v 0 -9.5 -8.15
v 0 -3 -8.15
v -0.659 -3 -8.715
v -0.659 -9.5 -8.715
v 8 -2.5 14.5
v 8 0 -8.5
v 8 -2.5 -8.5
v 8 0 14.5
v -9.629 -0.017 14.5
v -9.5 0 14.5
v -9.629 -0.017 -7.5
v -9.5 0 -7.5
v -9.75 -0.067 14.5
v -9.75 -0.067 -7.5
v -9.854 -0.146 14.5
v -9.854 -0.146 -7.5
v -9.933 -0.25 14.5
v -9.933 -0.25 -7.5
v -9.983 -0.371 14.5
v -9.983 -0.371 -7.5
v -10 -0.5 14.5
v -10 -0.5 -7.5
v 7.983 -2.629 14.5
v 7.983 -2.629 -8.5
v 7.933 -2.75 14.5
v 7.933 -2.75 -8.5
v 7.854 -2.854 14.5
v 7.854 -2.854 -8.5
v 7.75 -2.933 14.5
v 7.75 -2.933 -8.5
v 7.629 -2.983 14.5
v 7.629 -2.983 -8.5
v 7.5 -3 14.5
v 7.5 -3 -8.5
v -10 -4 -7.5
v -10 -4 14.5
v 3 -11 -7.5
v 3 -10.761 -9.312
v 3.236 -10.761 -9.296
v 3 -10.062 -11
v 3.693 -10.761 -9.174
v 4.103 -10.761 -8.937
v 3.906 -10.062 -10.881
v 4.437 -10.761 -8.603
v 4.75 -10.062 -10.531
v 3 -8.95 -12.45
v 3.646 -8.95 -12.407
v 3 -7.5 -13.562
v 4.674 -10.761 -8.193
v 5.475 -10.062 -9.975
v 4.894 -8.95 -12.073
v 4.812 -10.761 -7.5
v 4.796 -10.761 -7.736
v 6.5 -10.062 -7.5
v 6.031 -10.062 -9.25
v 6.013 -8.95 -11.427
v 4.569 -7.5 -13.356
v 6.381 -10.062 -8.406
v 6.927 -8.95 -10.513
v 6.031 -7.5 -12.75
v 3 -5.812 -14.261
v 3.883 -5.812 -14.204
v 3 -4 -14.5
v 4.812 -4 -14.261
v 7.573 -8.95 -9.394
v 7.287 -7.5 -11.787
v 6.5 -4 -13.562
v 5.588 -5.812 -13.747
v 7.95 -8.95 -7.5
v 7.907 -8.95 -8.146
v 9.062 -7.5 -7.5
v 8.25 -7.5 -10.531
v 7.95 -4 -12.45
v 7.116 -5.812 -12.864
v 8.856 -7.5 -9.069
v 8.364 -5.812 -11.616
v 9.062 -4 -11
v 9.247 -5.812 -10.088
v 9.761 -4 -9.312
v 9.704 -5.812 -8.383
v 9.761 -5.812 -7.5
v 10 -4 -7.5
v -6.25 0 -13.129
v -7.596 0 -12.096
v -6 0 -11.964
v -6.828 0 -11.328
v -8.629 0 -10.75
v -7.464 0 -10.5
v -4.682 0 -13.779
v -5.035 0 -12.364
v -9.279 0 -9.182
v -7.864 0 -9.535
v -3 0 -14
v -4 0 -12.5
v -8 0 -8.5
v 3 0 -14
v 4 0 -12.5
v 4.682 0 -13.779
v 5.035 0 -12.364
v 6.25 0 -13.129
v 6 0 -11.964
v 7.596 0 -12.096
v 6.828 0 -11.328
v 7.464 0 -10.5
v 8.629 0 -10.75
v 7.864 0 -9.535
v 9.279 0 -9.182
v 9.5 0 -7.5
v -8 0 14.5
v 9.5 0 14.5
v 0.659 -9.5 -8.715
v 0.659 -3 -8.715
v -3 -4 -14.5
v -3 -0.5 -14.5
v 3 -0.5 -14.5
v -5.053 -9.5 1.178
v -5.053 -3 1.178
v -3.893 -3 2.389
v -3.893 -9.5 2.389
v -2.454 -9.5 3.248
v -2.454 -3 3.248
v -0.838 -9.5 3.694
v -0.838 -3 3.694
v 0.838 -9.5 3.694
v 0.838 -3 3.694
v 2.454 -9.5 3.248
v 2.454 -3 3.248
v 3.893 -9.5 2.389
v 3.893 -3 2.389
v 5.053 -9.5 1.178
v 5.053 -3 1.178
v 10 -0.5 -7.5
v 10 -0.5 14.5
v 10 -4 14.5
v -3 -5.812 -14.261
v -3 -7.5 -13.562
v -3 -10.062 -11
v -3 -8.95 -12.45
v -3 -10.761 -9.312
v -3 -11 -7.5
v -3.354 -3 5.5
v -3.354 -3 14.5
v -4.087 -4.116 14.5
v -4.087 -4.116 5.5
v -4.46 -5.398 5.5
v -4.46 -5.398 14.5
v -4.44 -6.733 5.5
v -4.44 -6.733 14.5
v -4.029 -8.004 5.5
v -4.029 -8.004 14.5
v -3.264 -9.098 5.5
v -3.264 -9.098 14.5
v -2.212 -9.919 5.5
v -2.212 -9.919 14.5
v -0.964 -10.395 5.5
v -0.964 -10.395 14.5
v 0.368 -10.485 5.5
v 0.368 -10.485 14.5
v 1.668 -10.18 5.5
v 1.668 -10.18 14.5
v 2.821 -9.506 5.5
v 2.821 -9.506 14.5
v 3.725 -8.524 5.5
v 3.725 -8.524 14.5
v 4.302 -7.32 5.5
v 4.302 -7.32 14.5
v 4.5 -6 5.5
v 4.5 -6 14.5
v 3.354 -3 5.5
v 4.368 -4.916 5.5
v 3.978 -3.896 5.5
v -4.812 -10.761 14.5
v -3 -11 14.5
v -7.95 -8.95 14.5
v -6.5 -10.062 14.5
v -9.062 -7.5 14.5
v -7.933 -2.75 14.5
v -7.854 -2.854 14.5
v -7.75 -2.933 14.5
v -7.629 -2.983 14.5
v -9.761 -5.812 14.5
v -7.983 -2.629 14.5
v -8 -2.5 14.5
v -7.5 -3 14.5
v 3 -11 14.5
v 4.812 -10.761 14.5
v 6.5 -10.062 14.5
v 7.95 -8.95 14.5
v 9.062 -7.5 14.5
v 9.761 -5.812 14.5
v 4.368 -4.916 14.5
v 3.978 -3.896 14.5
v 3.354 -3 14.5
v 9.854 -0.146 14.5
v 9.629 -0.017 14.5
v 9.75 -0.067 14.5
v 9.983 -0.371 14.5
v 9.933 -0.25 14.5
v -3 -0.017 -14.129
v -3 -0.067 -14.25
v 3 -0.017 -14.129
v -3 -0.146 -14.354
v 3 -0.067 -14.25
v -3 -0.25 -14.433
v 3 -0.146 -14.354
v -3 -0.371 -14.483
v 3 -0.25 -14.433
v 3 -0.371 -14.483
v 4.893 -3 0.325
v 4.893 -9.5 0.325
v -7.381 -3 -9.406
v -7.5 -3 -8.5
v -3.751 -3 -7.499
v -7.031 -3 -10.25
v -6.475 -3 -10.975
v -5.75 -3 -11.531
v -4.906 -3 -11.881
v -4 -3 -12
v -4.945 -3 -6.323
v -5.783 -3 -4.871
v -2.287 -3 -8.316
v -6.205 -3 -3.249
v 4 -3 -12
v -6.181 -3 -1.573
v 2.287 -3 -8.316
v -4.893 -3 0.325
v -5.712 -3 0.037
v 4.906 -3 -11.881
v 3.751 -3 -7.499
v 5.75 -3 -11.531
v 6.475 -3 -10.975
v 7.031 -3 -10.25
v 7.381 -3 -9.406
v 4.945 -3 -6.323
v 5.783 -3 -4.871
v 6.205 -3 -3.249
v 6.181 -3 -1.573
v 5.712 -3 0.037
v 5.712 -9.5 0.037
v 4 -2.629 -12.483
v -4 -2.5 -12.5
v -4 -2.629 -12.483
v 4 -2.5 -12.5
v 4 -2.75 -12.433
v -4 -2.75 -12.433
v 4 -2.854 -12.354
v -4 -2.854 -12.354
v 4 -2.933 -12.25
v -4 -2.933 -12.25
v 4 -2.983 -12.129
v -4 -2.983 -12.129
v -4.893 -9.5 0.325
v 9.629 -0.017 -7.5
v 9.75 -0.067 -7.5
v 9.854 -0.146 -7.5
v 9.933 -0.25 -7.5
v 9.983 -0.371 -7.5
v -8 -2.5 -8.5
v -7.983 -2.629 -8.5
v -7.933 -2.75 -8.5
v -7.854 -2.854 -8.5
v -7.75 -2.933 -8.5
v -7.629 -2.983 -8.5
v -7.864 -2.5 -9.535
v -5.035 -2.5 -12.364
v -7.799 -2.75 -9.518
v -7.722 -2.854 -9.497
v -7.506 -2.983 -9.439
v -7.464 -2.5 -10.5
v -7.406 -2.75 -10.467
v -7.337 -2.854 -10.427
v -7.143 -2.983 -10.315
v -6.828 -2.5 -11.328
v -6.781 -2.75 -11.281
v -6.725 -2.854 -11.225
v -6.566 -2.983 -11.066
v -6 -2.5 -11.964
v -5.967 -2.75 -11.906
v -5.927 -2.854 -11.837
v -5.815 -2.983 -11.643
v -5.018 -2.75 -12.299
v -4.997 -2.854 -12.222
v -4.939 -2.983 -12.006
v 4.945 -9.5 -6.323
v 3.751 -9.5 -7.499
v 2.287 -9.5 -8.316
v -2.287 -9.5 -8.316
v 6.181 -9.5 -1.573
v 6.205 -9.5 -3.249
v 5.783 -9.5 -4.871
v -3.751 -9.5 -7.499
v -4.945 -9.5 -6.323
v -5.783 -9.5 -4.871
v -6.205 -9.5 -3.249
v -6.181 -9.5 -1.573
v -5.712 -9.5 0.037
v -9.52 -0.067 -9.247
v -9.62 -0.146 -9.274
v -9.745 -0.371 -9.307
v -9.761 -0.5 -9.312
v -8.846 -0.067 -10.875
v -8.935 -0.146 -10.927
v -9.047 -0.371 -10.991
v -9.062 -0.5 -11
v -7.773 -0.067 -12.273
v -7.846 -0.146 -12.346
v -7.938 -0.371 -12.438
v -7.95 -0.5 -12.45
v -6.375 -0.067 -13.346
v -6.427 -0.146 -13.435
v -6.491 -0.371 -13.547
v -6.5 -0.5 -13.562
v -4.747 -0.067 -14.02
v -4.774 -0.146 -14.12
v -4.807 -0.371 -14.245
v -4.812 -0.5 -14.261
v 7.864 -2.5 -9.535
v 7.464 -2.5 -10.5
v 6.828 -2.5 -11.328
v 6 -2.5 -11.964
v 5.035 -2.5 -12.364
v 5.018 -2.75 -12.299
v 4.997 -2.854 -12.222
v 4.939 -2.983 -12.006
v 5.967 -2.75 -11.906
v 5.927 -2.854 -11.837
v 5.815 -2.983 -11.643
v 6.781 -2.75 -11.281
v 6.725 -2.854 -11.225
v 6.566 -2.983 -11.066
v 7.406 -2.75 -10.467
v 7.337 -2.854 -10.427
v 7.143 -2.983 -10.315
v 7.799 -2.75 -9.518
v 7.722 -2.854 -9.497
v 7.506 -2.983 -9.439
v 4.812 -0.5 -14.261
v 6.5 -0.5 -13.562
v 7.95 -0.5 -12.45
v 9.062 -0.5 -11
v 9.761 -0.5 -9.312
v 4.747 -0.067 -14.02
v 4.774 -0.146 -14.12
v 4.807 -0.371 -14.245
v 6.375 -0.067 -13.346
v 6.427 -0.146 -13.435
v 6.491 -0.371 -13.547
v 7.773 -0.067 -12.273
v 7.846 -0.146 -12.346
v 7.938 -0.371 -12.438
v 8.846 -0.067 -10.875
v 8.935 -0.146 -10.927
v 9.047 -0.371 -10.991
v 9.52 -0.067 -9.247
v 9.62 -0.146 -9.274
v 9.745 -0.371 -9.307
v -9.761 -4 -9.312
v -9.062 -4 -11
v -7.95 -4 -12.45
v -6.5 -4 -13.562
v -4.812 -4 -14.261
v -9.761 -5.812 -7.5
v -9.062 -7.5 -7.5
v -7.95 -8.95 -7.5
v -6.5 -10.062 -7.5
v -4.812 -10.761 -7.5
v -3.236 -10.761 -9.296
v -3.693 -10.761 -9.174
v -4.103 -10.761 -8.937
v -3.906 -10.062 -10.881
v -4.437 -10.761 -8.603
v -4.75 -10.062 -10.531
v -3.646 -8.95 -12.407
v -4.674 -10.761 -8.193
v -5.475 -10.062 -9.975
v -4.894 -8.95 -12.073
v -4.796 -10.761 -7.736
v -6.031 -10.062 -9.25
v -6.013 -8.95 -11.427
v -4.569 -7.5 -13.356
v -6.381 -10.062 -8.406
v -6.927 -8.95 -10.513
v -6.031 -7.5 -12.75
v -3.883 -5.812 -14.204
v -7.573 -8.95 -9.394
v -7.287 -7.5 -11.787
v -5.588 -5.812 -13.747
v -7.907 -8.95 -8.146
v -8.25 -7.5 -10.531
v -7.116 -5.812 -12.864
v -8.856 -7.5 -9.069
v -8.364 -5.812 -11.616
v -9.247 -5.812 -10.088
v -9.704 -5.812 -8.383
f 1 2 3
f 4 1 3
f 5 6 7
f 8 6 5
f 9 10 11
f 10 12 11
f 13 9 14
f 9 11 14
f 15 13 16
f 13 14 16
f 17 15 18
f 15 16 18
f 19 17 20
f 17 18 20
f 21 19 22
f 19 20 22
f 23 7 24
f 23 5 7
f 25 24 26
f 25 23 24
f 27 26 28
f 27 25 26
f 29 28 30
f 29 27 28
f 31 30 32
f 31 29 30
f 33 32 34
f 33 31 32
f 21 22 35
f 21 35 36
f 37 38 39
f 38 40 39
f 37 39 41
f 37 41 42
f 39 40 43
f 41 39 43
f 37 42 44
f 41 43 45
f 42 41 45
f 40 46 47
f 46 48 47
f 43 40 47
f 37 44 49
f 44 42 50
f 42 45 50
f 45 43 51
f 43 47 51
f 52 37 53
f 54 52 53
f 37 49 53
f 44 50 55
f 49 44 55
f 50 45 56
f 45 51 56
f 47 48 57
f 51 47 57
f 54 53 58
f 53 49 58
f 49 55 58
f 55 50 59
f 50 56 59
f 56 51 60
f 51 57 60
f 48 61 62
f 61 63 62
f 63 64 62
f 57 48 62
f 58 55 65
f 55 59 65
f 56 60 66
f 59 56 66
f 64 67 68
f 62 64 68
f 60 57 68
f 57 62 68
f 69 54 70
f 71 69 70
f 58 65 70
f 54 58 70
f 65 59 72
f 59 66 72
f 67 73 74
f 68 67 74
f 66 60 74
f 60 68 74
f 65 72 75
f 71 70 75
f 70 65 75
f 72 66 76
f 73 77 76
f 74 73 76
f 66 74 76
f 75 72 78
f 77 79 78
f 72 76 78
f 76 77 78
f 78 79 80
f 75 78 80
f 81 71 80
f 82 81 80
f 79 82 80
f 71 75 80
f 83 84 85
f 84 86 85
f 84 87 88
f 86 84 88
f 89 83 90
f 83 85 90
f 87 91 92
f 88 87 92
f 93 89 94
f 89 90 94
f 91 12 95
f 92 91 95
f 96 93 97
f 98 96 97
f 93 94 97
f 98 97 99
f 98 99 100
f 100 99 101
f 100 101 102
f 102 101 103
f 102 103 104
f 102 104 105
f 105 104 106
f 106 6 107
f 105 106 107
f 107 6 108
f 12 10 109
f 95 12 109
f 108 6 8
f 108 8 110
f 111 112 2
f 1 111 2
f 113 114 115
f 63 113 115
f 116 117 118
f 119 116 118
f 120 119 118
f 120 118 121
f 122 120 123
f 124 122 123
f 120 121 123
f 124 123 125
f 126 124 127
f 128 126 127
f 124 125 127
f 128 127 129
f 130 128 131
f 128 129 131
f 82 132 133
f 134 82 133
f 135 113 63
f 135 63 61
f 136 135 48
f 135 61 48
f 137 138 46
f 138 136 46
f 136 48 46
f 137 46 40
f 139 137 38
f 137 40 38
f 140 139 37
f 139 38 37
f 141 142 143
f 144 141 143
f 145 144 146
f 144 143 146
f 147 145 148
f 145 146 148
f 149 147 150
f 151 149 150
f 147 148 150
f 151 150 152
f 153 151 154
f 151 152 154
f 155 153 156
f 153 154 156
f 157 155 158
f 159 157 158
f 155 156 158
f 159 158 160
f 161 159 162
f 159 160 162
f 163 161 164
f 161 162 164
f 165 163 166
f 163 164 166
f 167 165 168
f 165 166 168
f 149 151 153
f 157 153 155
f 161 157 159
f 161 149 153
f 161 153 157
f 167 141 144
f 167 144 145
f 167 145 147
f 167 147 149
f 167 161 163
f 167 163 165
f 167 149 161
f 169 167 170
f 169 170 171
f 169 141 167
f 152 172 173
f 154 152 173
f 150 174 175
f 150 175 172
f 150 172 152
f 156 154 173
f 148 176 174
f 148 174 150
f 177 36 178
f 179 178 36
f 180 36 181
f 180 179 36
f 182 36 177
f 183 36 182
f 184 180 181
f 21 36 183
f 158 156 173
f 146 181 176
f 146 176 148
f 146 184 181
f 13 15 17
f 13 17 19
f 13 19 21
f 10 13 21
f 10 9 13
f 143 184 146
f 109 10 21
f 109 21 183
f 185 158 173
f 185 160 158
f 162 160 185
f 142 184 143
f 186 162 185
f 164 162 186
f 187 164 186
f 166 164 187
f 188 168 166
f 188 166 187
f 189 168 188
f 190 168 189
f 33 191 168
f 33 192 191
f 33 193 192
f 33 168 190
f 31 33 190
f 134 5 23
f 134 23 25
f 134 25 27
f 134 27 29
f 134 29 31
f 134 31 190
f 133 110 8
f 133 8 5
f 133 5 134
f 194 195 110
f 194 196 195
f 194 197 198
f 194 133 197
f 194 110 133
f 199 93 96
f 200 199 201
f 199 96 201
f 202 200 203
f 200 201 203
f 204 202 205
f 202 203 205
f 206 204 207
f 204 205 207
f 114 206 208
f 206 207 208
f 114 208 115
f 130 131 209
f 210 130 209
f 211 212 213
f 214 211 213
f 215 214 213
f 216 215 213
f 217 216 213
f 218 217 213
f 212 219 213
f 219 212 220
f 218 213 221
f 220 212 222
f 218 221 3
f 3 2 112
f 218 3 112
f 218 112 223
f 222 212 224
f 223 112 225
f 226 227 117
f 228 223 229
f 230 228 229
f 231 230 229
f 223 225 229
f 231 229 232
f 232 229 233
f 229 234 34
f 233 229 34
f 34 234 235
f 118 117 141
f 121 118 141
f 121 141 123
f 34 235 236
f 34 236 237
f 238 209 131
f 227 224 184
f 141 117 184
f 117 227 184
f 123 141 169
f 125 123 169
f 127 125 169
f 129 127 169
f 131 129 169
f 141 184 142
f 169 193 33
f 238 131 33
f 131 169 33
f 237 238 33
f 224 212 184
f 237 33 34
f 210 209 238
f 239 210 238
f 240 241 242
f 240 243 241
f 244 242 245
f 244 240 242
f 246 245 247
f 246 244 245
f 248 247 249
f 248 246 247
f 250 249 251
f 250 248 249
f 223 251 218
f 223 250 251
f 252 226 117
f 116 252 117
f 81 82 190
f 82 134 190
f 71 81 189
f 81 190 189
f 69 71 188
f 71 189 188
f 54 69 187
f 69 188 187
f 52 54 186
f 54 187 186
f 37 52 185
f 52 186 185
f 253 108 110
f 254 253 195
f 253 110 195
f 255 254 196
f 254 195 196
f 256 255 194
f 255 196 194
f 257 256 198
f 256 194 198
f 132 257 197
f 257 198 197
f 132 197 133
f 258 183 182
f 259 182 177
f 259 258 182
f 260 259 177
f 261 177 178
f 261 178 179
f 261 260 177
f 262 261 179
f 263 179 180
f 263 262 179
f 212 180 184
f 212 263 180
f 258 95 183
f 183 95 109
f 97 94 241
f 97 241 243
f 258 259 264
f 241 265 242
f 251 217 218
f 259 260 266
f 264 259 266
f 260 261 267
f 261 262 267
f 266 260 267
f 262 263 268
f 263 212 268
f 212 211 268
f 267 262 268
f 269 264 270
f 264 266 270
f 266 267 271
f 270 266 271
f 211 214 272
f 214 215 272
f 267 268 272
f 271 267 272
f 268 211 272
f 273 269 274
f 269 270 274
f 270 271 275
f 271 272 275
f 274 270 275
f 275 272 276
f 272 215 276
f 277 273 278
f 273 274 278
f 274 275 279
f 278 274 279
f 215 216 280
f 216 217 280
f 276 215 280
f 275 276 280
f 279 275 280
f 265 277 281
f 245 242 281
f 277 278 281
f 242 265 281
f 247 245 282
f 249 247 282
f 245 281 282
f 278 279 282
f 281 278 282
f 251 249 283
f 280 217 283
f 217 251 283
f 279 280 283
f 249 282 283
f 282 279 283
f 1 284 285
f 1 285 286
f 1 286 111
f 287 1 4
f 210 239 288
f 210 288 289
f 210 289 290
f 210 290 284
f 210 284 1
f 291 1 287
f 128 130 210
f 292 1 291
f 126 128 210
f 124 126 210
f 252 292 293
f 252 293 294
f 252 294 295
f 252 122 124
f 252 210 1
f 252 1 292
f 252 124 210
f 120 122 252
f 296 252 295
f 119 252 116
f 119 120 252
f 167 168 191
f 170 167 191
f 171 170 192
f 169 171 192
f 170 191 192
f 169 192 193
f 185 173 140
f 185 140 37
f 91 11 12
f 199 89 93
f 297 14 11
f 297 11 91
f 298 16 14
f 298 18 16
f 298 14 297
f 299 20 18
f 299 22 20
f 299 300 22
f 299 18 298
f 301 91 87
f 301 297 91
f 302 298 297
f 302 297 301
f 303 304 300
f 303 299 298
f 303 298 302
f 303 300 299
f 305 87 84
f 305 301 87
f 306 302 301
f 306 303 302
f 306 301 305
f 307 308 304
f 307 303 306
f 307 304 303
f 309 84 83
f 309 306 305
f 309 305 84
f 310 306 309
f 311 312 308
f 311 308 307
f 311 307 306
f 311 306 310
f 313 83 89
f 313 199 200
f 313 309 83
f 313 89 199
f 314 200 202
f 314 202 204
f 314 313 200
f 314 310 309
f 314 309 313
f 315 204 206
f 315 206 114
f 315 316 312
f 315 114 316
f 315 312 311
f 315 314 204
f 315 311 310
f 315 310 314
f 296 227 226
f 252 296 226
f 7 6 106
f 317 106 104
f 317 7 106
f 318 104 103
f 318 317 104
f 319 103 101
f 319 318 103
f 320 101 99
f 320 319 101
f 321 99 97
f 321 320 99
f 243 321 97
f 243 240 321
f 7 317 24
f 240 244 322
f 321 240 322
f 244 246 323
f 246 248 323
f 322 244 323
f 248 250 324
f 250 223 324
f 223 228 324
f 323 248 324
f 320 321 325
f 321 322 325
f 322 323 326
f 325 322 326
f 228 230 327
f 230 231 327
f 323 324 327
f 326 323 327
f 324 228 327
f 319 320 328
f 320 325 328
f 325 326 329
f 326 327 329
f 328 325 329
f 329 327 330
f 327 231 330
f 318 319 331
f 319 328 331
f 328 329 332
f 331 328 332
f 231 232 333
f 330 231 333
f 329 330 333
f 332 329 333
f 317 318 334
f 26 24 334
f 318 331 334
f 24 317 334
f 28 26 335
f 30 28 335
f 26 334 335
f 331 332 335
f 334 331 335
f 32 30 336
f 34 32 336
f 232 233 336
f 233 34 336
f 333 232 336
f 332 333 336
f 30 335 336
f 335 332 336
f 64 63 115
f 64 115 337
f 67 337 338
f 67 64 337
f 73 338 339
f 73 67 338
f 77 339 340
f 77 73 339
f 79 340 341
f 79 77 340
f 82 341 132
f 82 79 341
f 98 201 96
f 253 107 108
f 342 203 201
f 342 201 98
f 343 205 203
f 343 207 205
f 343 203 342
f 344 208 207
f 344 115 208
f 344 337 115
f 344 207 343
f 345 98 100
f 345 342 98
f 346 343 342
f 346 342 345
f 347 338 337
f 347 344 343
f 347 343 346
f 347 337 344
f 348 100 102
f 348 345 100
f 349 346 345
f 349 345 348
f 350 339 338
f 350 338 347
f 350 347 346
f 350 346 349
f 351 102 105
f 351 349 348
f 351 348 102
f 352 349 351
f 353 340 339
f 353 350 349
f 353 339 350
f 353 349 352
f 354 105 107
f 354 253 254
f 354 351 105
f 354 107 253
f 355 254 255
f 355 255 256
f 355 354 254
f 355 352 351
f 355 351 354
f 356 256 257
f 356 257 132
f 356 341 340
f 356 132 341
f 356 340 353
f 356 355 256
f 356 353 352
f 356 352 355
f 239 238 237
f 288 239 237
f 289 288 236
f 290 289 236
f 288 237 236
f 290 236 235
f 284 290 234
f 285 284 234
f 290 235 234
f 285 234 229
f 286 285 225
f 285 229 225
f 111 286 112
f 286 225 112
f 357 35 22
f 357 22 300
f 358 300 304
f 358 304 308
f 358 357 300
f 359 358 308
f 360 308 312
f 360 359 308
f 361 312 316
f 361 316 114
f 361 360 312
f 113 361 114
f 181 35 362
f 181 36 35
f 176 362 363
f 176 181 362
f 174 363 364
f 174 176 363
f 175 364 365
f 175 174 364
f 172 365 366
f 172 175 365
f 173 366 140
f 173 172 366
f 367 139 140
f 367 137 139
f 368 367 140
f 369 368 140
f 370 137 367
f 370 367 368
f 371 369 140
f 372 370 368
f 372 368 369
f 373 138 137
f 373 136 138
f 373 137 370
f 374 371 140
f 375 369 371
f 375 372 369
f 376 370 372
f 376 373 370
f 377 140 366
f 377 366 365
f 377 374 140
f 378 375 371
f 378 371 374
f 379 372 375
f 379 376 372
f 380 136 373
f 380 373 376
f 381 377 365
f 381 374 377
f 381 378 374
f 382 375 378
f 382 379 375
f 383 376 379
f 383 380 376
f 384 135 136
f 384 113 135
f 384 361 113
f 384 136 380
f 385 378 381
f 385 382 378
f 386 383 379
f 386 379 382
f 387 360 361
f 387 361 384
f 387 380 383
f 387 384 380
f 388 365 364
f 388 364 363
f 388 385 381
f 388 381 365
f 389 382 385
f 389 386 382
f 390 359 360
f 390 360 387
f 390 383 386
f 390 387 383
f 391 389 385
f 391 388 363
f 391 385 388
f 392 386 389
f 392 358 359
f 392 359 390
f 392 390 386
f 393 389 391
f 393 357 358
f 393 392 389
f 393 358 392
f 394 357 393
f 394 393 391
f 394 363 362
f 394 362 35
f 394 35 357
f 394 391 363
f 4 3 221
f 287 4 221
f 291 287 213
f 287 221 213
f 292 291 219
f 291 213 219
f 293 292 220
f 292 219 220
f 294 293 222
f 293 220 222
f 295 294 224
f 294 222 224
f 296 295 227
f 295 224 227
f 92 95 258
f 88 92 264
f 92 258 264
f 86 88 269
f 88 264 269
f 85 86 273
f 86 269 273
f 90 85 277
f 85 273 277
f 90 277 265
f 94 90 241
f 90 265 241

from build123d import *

# Parameters (mm, degrees)
F0_W     = 20
F0_H     = 29
F1_DEPTH = 11
F2_W     = 16
F2_H     = 30
F3_DEPTH = 3
F5_DEPTH = 6.5
F7_DEPTH = 9
F8_R     = 4
F9_R     = 7
F10_R    = 0.5


with BuildPart() as f1:
    # F0 (on Front) → F1 (new body)
    with BuildSketch(Plane.XZ):
        Rectangle(F0_W, F0_H)
    extrude(amount=F1_DEPTH)

    # F2 (on face) → F3 (cut)
    with BuildSketch(Plane.XZ):
        with Locations((0, 2.5)):
            Rectangle(F2_W, F2_H)
    extrude(amount=F3_DEPTH, mode=Mode.SUBTRACT)

    # F4 (on face) → F5 (cut)
    with BuildSketch(Plane(origin=(0, -3, 0), x_dir=(-1, 0, 0), z_dir=(0, 1, 0))):
        with BuildLine():
            Line((0, -8.15), (0.659236, -8.715135))
            ThreePointArc((0.659236, -8.715135), (5.412659, -5.625), (5.712083, 0.036653))
            Line((5.712083, 0.036653), (4.893044, 0.325))
            Line((4.893044, 0.325), (5.052847, 1.178482))
            ThreePointArc((5.052847, 1.178482), (0, 3.75), (-5.052847, 1.178482))
            Line((-5.052847, 1.178482), (-4.893044, 0.325))
            Line((-4.893044, 0.325), (-5.712083, 0.036653))
            ThreePointArc((-5.712083, 0.036653), (-5.412659, -5.625), (-0.659236, -8.715135))
            Line((-0.659236, -8.715135), (0, -8.15))
        make_face()
    extrude(amount=-F5_DEPTH, mode=Mode.SUBTRACT)

    # F6 (on face) → F7 (cut)
    with BuildSketch(Plane.XY.offset(14.5)):
        with BuildLine():
            ThreePointArc((-3.354102, -3), (-1.605699, -10.203776), (4.5, -6))
            ThreePointArc((4.5, -6), (4.203776, -4.394301), (3.354102, -3))
            Line((3.354102, -3), (-3.354102, -3))
        make_face()
    extrude(amount=-F7_DEPTH, mode=Mode.SUBTRACT)

    # F8
    f8_edges = [f1.edges().sort_by_distance(p)[0] for p in [
        (8, -1.5, -12.5),
        (-8, -1.5, -12.5),
    ]]
    fillet(f8_edges, radius=F8_R)

    # F9
    f9_edges = [f1.edges().sort_by_distance(p)[0] for p in [
        (-10, -5.5, -14.5),
        (10, -5.5, -14.5),
        (0, -11, -14.5),
        (10, -11, 0),
        (-10, -11, 0),
    ]]
    fillet(f9_edges, radius=F9_R)

    # F10
    f10_edges = [f1.edges().sort_by_distance(p)[0] for p in [
        (8, -3, 3),
        (10, 0, 3.5),
    ]]
    fillet(f10_edges, radius=F10_R)


solid = f1.part
